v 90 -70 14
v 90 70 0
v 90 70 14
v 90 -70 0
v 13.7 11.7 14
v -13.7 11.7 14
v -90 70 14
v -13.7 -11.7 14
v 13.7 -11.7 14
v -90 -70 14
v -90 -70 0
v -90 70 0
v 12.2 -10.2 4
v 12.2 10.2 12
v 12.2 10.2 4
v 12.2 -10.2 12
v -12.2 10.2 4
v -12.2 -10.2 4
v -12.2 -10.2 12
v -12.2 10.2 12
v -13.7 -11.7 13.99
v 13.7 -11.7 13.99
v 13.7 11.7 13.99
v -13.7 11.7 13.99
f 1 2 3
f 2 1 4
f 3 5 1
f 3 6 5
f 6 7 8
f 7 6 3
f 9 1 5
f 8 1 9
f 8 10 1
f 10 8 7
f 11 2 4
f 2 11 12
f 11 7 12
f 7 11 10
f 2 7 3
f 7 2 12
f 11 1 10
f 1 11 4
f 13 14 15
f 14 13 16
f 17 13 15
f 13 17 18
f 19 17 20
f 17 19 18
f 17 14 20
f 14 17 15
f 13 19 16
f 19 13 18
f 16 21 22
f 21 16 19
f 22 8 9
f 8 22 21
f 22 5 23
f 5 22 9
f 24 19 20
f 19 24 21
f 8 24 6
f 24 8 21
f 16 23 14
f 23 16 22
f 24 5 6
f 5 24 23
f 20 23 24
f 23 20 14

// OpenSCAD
// Headphone stand: base, post, hanger. Units mm. Print orientation = export orientation (+Z up).
part = "base"; // [base, post, hanger, assembly]
cadverify_only = "";

/* Parameters */
base_L = 180; base_W = 140; base_H = 14;
base_sock_L = 24.4; base_sock_W = 20.4; base_sock_D = 10; // depth from top
base_floor = base_H - base_sock_D; // 4
base_cham_H = 2; base_cham_extra = 1.5; // per side funnel

post_low_L = 24; post_low_W = 20; post_low_H = 10;
post_flare_H = 6;
post_shaft_L = 34; post_shaft_W = 28;
post_shaft_bot = post_low_H + post_flare_H; // 16
post_shaft_top = 230;
post_shaft_H = post_shaft_top - post_shaft_bot; // 214
post_up_L = 20; post_up_W = 16; post_up_H = 12;
post_up_cham_H = 1.5; post_up_cham_extra = 1.5; // per side taper at top
post_H = post_shaft_top + post_up_H; // 242

hanger_L = 120; hanger_W = 36; hanger_base_H = 14; hanger_R = 18; // half-cyl radius = W/2
hanger_cyl_H = 18; // cylinder peak 14+18=32
lip_L = 10; lip_W = 36; lip_bot = 14; lip_top = 36; // end stops 14..36
hanger_H = 36;
hanger_sock_L = 20.4; hanger_sock_W = 16.4; hanger_sock_D = 12; // straight depth from bottom
hanger_roof_H = 10; // triangular roof above straight, ridge along X
hanger_cham_H = 2; hanger_cham_extra = 1.5;

asm_post_Z = base_floor; // 4, post bottom in assembly
asm_hanger_Z = 234; // hanger bottom in assembly
// shaft top 230 + post bottom 4 = 234 = hanger bottom; tenon 230..242 -> hanger 0..12; hanger top 234+36=270

module instance(name, part, unit = 1) {
    echo(cadverify_instance = [name, part, unit]);
    if (cadverify_only == "" || cadverify_only == name) children();
}

module base_part() {
    difference() {
        translate([-base_L/2, -base_W/2, 0]) cube([base_L, base_W, base_H]);
        // straight socket
        translate([-base_sock_L/2, -base_sock_W/2, base_floor])
            cube([base_sock_L, base_sock_W, base_sock_D+0.01]);
        // entry funnel (frustum widening upward)
        hull() {
            translate([-base_sock_L/2, -base_sock_W/2, base_H-base_cham_H])
                cube([base_sock_L, base_sock_W, 0.01]);
            translate([-(base_sock_L/2+base_cham_extra), -(base_sock_W/2+base_cham_extra), base_H-0.01])
                cube([base_sock_L+2*base_cham_extra, base_sock_W+2*base_cham_extra, 0.01]);
        }
    }
}

module post_part() {
    // lower tenon (press fit into base)
    translate([-post_low_L/2, -post_low_W/2, 0]) cube([post_low_L, post_low_W, post_low_H]);
    // flare collar 45deg-compatible transition to shaft
    hull() {
        translate([-post_low_L/2, -post_low_W/2, post_low_H-0.01])
            cube([post_low_L, post_low_W, 0.01]);
        translate([-post_shaft_L/2, -post_shaft_W/2, post_shaft_bot-0.01])
            cube([post_shaft_L, post_shaft_W, 0.01]);
    }
    // shaft
    translate([-post_shaft_L/2, -post_shaft_W/2, post_shaft_bot])
        cube([post_shaft_L, post_shaft_W, post_shaft_H]);
    // upper tenon straight part
    translate([-post_up_L/2, -post_up_W/2, post_shaft_top])
        cube([post_up_L, post_up_W, post_up_H-post_up_cham_H]);
    // upper tenon lead chamfer (tapers inward going up)
    hull() {
        translate([-post_up_L/2, -post_up_W/2, post_H-post_up_cham_H-0.01])
            cube([post_up_L, post_up_W, 0.01]);
        translate([-(post_up_L/2-post_up_cham_extra), -(post_up_W/2-post_up_cham_extra), post_H-0.01])
            cube([post_up_L-2*post_up_cham_extra, post_up_W-2*post_up_cham_extra, 0.01]);
    }
}

module hanger_part() {
    difference() {
        union() {
            // base box
            translate([-hanger_L/2, -hanger_W/2, 0]) cube([hanger_L, hanger_W, hanger_base_H]);
            // rounded top: half cylinder along X
            intersection() {
                translate([0, 0, hanger_base_H]) rotate([0, 90, 0])
                    cylinder(r=hanger_R, h=hanger_L, center=true, $fn=128);
                translate([-hanger_L/2, -hanger_W/2, hanger_base_H]) cube([hanger_L, hanger_W, hanger_cyl_H]);
            }
            // end stops (full height from base top, no floating ledge)
            for (sx=[-1,1])
                translate([sx*(hanger_L/2-lip_L), -lip_W/2, lip_bot])
                    cube([lip_L, lip_W, lip_top-lip_bot]);
        }
        // straight socket
        translate([-hanger_sock_L/2, -hanger_sock_W/2, 0])
            cube([hanger_sock_L, hanger_sock_W, hanger_sock_D]);
        // entry funnel at mouth (widens downward)
        hull() {
            translate([-hanger_sock_L/2, -hanger_sock_W/2, hanger_cham_H])
                cube([hanger_sock_L, hanger_sock_W, 0.01]);
            translate([-(hanger_sock_L/2+hanger_cham_extra), -(hanger_sock_W/2+hanger_cham_extra), -0.01])
                cube([hanger_sock_L+2*hanger_cham_extra, hanger_sock_W+2*hanger_cham_extra, 0.01]);
        }
        // pointed roof above straight (ridge along X), self-supporting slopes
        hull() {
            translate([-hanger_sock_L/2, -hanger_sock_W/2, hanger_sock_D-0.01])
                cube([hanger_sock_L, hanger_sock_W, 0.01]);
            translate([-hanger_sock_L/2, -0.01, hanger_sock_D+hanger_roof_H-0.01])
                cube([hanger_sock_L, 0.02, 0.01]);
        }
    }
}

// --- specs (print coords) ---
if (part == "base") {
    echo(cadverify_spec = [
        ["bounds", [[-base_L/2, -base_W/2, 0], [base_L/2, base_W/2, base_H]]],
        ["bodies", 1],
        ["through_holes", 0],
        ["support_faces", [["base_bottom", "-z", 20000]]],
        ["overhangs_allowed", []],
        ["copies", 1],
        ["details", [
            ["base_plate", "material", [[50, 40, 0], [80, 60, base_H]], 0.9],
            ["socket", "void", [[-base_sock_L/2, -base_sock_W/2, base_floor], [base_sock_L/2, base_sock_W/2, base_H]], 0.9],
            ["socket_funnel", "void", [[-(base_sock_L/2+base_cham_extra), -(base_sock_W/2+base_cham_extra), base_H-base_cham_H], [base_sock_L/2+base_cham_extra, base_sock_W/2+base_cham_extra, base_H]], 0.7],
            ["floor", "thickness", [0, 0, -1], [0, 0, 1], base_floor],
            ["top_face", "view", [[-60, -50, base_H-1], [60, 50, base_H+1]]]
        ]]
    ]);
    base_part();
} else if (part == "post") {
    echo(cadverify_spec = [
        ["bounds", [[-post_shaft_L/2, -post_shaft_W/2, 0], [post_shaft_L/2, post_shaft_W/2, post_H]]],
        ["bodies", 1],
        ["through_holes", 0],
        ["support_faces", [["post_bottom", "-z", 400]]],
        ["overhangs_allowed", []],
        ["copies", 1],
        ["details", [
            ["shaft", "material", [[-10, -8, 60], [10, 8, 160]], 0.9],
            ["lower_tenon", "material", [[-post_low_L/2, -post_low_W/2, 0], [post_low_L/2, post_low_W/2, post_low_H]], 0.9],
            ["upper_tenon", "material", [[-post_up_L/2, -post_up_W/2, post_shaft_top], [post_up_L/2, post_up_W/2, post_H]], 0.8],
            ["collar", "material", [[-14, -12, post_low_H], [14, 12, post_shaft_bot]], 0.7],
            ["shaft_wall", "thickness", [30, 0, 116], [-1, 0, 0], post_shaft_L],
            ["tenon_tip", "view", [[-post_up_L/2, -post_up_W/2, post_H-4], [post_up_L/2, post_up_W/2, post_H+1]]]
        ]]
    ]);
    post_part();
} else if (part == "hanger") {
    echo(cadverify_spec = [
        ["bounds", [[-hanger_L/2, -hanger_W/2, 0], [hanger_L/2, hanger_W/2, hanger_H]]],
        ["bodies", 1],
        ["through_holes", 0],
        ["support_faces", [["hanger_bottom", "-z", 3000]]],
        ["overhangs_allowed", []],
        ["copies", 1],
        ["details", [
            ["saddle", "material", [[-40, -8, 20], [40, 8, 26]], 0.9],
            ["end_stop", "material", [[hanger_L/2-lip_L, -lip_W/2, lip_bot], [hanger_L/2, lip_W/2, lip_top]], 0.9],
            ["socket", "void", [[-hanger_sock_L/2, -hanger_sock_W/2, 0], [hanger_sock_L/2, hanger_sock_W/2, hanger_sock_D]], 0.9],
            ["socket_funnel", "void", [[-(hanger_sock_L/2+hanger_cham_extra), -(hanger_sock_W/2+hanger_cham_extra), 0], [hanger_sock_L/2+hanger_cham_extra, hanger_sock_W/2+hanger_cham_extra, hanger_cham_H]], 0.7],
            ["top_skin", "thickness", [0, 0, hanger_H+4], [0, 0, -1], (hanger_base_H+hanger_cyl_H)-(hanger_sock_D+hanger_roof_H)],
            ["round_top", "view", [[-40, -hanger_W/2, hanger_base_H], [40, hanger_W/2, hanger_base_H+hanger_cyl_H+1]]]
        ]]
    ]);
    hanger_part();
} else if (part == "assembly") {
    echo(cadverify_spec = [
        ["bounds", [[-base_L/2, -base_W/2, 0], [base_L/2, base_W/2, asm_hanger_Z+hanger_H]]],
        ["support_faces", [["desk", "-z", 20000]]],
        ["allowed_interferences", []],
        ["motions", []],
        ["assembly_order", [
            [[ "base_inst" ], [0, 0, 0]],
            [[ "post_inst" ], [0, 0, -1]],
            [[ "hanger_inst" ], [0, 0, -1]]
        ]],
        ["overhangs_allowed", []]
    ]);
    instance("base_inst", "base") base_part();
    instance("post_inst", "post") translate([0, 0, asm_post_Z]) post_part();
    instance("hanger_inst", "hanger") translate([0, 0, asm_hanger_Z]) hanger_part();
}
